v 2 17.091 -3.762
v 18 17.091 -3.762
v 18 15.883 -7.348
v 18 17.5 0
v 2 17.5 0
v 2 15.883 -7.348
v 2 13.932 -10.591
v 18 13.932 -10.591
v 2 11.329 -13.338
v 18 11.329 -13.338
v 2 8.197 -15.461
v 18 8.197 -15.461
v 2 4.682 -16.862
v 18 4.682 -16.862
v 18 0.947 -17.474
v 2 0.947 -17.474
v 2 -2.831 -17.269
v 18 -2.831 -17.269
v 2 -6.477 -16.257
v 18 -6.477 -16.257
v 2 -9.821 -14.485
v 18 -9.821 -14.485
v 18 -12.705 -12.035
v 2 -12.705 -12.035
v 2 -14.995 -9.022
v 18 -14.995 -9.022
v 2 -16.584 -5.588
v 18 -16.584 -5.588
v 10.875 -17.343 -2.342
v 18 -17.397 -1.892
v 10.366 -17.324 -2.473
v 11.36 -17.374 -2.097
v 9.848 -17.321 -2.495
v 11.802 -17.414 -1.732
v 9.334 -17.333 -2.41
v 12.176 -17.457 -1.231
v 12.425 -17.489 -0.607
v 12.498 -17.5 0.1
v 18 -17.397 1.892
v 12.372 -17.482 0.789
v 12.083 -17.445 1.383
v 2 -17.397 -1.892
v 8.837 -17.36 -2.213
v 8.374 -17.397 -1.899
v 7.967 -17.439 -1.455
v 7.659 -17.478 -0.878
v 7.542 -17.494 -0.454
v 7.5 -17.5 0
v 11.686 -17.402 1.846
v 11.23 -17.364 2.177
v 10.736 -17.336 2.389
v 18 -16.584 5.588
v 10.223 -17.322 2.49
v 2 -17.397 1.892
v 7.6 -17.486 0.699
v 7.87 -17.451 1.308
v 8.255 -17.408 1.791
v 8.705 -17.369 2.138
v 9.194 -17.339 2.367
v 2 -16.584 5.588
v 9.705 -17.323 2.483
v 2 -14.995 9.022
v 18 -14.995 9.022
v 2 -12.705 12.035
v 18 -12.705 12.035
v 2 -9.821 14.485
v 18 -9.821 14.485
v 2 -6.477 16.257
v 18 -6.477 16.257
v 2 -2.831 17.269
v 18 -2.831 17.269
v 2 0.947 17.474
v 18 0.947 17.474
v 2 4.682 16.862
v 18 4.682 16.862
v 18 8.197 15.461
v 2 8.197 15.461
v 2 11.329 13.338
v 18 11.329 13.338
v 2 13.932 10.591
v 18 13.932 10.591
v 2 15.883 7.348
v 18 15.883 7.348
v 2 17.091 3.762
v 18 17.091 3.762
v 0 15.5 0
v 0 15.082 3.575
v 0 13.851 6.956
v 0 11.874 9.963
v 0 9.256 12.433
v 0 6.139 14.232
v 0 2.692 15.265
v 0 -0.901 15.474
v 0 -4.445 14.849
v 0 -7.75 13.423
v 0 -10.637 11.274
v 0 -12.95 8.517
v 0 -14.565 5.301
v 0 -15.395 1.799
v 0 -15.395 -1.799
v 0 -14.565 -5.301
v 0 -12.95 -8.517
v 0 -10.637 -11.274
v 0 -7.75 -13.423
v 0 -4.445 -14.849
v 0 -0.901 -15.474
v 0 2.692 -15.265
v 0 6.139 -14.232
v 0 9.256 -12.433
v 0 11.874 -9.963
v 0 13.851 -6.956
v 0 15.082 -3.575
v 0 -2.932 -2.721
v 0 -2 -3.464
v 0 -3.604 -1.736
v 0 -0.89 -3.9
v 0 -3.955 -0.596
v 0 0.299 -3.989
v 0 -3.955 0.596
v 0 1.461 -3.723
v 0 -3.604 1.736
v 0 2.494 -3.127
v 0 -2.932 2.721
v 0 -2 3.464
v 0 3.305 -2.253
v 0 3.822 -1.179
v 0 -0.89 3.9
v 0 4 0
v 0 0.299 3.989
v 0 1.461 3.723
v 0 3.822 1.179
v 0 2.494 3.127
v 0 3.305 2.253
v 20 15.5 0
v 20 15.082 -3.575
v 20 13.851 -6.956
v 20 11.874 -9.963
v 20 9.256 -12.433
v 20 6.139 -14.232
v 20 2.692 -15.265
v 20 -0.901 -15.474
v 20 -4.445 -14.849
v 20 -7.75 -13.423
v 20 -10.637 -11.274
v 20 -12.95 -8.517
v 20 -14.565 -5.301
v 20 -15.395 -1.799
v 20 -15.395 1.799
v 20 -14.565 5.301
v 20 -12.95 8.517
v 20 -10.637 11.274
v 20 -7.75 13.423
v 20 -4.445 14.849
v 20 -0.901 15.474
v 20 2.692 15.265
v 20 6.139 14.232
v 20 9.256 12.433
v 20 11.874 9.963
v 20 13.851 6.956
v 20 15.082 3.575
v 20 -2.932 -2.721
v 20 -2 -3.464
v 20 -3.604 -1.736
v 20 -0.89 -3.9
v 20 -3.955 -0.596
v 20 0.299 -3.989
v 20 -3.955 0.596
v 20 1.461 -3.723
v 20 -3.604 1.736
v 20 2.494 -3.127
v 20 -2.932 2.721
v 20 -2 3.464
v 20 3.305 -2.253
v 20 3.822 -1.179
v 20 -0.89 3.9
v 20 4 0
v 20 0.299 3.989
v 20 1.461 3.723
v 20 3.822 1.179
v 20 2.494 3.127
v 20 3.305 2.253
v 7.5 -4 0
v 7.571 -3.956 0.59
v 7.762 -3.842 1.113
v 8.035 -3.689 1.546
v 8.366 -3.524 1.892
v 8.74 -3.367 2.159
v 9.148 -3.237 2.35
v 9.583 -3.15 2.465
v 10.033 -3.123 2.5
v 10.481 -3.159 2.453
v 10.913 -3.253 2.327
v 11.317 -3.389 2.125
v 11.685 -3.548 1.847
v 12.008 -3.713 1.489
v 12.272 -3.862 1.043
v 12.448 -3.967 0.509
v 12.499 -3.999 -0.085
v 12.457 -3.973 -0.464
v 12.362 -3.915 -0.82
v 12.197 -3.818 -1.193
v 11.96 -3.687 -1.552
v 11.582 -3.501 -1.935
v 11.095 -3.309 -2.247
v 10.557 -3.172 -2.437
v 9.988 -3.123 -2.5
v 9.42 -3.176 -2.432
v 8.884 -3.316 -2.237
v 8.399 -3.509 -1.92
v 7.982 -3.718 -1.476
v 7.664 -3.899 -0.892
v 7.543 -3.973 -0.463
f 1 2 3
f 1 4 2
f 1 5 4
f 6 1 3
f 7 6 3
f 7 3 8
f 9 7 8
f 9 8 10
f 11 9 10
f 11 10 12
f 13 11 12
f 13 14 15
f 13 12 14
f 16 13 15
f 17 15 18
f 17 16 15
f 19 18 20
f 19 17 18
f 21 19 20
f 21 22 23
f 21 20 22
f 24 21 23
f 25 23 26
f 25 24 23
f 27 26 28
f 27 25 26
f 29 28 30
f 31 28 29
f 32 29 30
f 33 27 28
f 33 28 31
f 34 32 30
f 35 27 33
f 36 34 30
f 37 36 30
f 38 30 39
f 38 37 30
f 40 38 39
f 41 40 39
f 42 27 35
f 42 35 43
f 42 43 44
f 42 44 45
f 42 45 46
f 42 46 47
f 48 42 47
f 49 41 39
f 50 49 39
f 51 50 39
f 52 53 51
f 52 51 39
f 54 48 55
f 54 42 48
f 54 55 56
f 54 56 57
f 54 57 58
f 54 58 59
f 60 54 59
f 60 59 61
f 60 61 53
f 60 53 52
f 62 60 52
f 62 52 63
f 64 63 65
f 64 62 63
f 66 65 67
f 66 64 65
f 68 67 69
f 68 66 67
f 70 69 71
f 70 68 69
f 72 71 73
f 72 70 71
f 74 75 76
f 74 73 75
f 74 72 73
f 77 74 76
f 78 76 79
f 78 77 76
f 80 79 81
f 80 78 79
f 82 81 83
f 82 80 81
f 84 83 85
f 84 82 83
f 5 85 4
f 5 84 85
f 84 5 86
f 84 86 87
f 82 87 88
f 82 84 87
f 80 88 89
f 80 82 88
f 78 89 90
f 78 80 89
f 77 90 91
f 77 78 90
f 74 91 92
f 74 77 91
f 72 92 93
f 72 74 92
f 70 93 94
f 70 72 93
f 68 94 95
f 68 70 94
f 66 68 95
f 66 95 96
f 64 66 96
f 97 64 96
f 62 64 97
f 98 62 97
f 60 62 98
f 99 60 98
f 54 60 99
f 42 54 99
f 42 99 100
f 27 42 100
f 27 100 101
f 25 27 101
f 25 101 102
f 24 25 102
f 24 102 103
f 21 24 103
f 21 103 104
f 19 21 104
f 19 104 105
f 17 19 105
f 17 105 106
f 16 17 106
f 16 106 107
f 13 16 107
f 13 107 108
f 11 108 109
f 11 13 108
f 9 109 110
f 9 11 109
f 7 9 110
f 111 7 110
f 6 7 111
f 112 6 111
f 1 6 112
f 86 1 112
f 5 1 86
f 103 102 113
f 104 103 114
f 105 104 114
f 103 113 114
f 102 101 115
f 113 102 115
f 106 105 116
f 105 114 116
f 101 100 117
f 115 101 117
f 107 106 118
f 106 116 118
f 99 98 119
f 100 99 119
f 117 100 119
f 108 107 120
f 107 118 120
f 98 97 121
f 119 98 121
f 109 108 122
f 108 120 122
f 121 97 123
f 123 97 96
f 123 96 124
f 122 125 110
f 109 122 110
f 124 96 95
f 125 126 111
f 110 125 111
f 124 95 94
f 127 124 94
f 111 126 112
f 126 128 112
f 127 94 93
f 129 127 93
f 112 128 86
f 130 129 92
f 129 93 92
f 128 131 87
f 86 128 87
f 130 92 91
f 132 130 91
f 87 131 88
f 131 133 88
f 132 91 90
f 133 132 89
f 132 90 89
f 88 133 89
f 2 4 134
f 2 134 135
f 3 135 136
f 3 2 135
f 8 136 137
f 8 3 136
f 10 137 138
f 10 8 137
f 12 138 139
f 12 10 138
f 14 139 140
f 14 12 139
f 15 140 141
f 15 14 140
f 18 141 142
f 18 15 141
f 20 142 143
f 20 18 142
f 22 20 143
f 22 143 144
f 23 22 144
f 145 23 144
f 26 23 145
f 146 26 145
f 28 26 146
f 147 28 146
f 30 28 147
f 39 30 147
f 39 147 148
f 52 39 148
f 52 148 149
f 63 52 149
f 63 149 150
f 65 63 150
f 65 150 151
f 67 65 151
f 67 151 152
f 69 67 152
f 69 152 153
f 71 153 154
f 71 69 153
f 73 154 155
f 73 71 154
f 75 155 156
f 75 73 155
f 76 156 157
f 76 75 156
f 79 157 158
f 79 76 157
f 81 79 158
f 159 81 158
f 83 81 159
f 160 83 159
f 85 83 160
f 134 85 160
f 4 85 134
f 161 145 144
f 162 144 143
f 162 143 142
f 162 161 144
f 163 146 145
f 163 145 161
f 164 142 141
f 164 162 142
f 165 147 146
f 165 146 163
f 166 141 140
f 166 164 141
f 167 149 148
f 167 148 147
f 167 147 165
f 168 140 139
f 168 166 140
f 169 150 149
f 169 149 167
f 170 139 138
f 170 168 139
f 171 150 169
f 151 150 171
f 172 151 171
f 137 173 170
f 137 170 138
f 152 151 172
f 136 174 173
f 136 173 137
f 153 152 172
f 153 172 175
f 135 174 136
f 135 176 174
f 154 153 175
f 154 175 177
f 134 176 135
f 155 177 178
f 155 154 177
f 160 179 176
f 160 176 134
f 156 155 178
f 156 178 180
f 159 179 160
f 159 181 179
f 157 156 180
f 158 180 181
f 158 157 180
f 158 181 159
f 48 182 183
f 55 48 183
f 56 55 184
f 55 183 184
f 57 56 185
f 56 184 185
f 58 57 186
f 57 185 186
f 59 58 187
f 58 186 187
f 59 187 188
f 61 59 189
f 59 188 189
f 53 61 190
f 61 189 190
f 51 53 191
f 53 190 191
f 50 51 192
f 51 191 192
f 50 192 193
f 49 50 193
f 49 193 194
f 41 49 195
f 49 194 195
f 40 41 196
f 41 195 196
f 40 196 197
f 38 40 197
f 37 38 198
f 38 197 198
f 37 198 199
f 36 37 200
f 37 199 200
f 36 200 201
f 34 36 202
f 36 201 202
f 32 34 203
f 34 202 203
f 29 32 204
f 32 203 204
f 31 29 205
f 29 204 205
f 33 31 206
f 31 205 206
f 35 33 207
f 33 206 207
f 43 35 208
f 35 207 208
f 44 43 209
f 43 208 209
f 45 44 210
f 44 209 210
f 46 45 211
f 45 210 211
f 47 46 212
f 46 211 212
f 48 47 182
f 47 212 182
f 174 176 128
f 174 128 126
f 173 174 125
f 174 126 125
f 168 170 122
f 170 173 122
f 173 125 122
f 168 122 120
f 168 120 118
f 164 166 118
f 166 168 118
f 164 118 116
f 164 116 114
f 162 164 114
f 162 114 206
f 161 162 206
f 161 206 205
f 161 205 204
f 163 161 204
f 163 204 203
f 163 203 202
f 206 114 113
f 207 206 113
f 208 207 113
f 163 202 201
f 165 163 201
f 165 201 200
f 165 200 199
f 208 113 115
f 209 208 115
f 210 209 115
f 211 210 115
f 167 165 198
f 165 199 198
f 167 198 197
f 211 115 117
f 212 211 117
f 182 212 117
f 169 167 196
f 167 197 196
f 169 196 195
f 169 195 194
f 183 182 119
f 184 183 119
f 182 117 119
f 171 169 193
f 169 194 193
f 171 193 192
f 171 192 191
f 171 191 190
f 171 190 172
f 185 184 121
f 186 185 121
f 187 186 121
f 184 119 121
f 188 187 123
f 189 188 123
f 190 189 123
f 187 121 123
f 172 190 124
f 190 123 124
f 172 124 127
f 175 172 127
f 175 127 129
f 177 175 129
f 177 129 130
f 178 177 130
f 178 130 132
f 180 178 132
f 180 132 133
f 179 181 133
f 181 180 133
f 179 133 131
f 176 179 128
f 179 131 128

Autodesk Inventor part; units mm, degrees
ref_plane "YZ Plane" through (0, 0, 0) normal (1, 0, 0) x (0, 1, 0)
ref_plane "XZ Plane" through (0, 0, 0) normal (0, 1, 0) x (-1, 0, 0)
ref_plane "XY Plane" through (0, 0, 0) normal (0, 0, 1) x (1, 0, 0)
sketch "Sketch1" plane through (0, 0, 0) normal (1, 0, 0) x (0, 1, 0)
  circle A0 centre (0, 0) radius 4
  circle A1 centre (0, 0) radius 17.5
  dimension "d0" = 8
  dimension "d1" = 35
extrude "Extrusion1" add sketch "Sketch1" along normal blind 20
chamfer "Chamfer1" distance 2 angle 45 2 edges at (0, -17.5, 0) (20, -17.5, 0)
sketch "Sketch2" plane through (0, 0, 0) normal (0, 1, 0) x (-1, 0, 0)
  line L0 (0, 0) -> (-10, 0)
  circle A0 centre (-10, 0) radius 2.5
  dimension "d7" = 10
  dimension "d8" = 5
extrude "Extrusion2" cut sketch "Sketch2" against normal blind 20
thread "Thread1" size "M5x0.8" class "6H" standard "ANSI Metric M Profile" length 15
properties part number "counterweight#" material "Stainless Steel"
